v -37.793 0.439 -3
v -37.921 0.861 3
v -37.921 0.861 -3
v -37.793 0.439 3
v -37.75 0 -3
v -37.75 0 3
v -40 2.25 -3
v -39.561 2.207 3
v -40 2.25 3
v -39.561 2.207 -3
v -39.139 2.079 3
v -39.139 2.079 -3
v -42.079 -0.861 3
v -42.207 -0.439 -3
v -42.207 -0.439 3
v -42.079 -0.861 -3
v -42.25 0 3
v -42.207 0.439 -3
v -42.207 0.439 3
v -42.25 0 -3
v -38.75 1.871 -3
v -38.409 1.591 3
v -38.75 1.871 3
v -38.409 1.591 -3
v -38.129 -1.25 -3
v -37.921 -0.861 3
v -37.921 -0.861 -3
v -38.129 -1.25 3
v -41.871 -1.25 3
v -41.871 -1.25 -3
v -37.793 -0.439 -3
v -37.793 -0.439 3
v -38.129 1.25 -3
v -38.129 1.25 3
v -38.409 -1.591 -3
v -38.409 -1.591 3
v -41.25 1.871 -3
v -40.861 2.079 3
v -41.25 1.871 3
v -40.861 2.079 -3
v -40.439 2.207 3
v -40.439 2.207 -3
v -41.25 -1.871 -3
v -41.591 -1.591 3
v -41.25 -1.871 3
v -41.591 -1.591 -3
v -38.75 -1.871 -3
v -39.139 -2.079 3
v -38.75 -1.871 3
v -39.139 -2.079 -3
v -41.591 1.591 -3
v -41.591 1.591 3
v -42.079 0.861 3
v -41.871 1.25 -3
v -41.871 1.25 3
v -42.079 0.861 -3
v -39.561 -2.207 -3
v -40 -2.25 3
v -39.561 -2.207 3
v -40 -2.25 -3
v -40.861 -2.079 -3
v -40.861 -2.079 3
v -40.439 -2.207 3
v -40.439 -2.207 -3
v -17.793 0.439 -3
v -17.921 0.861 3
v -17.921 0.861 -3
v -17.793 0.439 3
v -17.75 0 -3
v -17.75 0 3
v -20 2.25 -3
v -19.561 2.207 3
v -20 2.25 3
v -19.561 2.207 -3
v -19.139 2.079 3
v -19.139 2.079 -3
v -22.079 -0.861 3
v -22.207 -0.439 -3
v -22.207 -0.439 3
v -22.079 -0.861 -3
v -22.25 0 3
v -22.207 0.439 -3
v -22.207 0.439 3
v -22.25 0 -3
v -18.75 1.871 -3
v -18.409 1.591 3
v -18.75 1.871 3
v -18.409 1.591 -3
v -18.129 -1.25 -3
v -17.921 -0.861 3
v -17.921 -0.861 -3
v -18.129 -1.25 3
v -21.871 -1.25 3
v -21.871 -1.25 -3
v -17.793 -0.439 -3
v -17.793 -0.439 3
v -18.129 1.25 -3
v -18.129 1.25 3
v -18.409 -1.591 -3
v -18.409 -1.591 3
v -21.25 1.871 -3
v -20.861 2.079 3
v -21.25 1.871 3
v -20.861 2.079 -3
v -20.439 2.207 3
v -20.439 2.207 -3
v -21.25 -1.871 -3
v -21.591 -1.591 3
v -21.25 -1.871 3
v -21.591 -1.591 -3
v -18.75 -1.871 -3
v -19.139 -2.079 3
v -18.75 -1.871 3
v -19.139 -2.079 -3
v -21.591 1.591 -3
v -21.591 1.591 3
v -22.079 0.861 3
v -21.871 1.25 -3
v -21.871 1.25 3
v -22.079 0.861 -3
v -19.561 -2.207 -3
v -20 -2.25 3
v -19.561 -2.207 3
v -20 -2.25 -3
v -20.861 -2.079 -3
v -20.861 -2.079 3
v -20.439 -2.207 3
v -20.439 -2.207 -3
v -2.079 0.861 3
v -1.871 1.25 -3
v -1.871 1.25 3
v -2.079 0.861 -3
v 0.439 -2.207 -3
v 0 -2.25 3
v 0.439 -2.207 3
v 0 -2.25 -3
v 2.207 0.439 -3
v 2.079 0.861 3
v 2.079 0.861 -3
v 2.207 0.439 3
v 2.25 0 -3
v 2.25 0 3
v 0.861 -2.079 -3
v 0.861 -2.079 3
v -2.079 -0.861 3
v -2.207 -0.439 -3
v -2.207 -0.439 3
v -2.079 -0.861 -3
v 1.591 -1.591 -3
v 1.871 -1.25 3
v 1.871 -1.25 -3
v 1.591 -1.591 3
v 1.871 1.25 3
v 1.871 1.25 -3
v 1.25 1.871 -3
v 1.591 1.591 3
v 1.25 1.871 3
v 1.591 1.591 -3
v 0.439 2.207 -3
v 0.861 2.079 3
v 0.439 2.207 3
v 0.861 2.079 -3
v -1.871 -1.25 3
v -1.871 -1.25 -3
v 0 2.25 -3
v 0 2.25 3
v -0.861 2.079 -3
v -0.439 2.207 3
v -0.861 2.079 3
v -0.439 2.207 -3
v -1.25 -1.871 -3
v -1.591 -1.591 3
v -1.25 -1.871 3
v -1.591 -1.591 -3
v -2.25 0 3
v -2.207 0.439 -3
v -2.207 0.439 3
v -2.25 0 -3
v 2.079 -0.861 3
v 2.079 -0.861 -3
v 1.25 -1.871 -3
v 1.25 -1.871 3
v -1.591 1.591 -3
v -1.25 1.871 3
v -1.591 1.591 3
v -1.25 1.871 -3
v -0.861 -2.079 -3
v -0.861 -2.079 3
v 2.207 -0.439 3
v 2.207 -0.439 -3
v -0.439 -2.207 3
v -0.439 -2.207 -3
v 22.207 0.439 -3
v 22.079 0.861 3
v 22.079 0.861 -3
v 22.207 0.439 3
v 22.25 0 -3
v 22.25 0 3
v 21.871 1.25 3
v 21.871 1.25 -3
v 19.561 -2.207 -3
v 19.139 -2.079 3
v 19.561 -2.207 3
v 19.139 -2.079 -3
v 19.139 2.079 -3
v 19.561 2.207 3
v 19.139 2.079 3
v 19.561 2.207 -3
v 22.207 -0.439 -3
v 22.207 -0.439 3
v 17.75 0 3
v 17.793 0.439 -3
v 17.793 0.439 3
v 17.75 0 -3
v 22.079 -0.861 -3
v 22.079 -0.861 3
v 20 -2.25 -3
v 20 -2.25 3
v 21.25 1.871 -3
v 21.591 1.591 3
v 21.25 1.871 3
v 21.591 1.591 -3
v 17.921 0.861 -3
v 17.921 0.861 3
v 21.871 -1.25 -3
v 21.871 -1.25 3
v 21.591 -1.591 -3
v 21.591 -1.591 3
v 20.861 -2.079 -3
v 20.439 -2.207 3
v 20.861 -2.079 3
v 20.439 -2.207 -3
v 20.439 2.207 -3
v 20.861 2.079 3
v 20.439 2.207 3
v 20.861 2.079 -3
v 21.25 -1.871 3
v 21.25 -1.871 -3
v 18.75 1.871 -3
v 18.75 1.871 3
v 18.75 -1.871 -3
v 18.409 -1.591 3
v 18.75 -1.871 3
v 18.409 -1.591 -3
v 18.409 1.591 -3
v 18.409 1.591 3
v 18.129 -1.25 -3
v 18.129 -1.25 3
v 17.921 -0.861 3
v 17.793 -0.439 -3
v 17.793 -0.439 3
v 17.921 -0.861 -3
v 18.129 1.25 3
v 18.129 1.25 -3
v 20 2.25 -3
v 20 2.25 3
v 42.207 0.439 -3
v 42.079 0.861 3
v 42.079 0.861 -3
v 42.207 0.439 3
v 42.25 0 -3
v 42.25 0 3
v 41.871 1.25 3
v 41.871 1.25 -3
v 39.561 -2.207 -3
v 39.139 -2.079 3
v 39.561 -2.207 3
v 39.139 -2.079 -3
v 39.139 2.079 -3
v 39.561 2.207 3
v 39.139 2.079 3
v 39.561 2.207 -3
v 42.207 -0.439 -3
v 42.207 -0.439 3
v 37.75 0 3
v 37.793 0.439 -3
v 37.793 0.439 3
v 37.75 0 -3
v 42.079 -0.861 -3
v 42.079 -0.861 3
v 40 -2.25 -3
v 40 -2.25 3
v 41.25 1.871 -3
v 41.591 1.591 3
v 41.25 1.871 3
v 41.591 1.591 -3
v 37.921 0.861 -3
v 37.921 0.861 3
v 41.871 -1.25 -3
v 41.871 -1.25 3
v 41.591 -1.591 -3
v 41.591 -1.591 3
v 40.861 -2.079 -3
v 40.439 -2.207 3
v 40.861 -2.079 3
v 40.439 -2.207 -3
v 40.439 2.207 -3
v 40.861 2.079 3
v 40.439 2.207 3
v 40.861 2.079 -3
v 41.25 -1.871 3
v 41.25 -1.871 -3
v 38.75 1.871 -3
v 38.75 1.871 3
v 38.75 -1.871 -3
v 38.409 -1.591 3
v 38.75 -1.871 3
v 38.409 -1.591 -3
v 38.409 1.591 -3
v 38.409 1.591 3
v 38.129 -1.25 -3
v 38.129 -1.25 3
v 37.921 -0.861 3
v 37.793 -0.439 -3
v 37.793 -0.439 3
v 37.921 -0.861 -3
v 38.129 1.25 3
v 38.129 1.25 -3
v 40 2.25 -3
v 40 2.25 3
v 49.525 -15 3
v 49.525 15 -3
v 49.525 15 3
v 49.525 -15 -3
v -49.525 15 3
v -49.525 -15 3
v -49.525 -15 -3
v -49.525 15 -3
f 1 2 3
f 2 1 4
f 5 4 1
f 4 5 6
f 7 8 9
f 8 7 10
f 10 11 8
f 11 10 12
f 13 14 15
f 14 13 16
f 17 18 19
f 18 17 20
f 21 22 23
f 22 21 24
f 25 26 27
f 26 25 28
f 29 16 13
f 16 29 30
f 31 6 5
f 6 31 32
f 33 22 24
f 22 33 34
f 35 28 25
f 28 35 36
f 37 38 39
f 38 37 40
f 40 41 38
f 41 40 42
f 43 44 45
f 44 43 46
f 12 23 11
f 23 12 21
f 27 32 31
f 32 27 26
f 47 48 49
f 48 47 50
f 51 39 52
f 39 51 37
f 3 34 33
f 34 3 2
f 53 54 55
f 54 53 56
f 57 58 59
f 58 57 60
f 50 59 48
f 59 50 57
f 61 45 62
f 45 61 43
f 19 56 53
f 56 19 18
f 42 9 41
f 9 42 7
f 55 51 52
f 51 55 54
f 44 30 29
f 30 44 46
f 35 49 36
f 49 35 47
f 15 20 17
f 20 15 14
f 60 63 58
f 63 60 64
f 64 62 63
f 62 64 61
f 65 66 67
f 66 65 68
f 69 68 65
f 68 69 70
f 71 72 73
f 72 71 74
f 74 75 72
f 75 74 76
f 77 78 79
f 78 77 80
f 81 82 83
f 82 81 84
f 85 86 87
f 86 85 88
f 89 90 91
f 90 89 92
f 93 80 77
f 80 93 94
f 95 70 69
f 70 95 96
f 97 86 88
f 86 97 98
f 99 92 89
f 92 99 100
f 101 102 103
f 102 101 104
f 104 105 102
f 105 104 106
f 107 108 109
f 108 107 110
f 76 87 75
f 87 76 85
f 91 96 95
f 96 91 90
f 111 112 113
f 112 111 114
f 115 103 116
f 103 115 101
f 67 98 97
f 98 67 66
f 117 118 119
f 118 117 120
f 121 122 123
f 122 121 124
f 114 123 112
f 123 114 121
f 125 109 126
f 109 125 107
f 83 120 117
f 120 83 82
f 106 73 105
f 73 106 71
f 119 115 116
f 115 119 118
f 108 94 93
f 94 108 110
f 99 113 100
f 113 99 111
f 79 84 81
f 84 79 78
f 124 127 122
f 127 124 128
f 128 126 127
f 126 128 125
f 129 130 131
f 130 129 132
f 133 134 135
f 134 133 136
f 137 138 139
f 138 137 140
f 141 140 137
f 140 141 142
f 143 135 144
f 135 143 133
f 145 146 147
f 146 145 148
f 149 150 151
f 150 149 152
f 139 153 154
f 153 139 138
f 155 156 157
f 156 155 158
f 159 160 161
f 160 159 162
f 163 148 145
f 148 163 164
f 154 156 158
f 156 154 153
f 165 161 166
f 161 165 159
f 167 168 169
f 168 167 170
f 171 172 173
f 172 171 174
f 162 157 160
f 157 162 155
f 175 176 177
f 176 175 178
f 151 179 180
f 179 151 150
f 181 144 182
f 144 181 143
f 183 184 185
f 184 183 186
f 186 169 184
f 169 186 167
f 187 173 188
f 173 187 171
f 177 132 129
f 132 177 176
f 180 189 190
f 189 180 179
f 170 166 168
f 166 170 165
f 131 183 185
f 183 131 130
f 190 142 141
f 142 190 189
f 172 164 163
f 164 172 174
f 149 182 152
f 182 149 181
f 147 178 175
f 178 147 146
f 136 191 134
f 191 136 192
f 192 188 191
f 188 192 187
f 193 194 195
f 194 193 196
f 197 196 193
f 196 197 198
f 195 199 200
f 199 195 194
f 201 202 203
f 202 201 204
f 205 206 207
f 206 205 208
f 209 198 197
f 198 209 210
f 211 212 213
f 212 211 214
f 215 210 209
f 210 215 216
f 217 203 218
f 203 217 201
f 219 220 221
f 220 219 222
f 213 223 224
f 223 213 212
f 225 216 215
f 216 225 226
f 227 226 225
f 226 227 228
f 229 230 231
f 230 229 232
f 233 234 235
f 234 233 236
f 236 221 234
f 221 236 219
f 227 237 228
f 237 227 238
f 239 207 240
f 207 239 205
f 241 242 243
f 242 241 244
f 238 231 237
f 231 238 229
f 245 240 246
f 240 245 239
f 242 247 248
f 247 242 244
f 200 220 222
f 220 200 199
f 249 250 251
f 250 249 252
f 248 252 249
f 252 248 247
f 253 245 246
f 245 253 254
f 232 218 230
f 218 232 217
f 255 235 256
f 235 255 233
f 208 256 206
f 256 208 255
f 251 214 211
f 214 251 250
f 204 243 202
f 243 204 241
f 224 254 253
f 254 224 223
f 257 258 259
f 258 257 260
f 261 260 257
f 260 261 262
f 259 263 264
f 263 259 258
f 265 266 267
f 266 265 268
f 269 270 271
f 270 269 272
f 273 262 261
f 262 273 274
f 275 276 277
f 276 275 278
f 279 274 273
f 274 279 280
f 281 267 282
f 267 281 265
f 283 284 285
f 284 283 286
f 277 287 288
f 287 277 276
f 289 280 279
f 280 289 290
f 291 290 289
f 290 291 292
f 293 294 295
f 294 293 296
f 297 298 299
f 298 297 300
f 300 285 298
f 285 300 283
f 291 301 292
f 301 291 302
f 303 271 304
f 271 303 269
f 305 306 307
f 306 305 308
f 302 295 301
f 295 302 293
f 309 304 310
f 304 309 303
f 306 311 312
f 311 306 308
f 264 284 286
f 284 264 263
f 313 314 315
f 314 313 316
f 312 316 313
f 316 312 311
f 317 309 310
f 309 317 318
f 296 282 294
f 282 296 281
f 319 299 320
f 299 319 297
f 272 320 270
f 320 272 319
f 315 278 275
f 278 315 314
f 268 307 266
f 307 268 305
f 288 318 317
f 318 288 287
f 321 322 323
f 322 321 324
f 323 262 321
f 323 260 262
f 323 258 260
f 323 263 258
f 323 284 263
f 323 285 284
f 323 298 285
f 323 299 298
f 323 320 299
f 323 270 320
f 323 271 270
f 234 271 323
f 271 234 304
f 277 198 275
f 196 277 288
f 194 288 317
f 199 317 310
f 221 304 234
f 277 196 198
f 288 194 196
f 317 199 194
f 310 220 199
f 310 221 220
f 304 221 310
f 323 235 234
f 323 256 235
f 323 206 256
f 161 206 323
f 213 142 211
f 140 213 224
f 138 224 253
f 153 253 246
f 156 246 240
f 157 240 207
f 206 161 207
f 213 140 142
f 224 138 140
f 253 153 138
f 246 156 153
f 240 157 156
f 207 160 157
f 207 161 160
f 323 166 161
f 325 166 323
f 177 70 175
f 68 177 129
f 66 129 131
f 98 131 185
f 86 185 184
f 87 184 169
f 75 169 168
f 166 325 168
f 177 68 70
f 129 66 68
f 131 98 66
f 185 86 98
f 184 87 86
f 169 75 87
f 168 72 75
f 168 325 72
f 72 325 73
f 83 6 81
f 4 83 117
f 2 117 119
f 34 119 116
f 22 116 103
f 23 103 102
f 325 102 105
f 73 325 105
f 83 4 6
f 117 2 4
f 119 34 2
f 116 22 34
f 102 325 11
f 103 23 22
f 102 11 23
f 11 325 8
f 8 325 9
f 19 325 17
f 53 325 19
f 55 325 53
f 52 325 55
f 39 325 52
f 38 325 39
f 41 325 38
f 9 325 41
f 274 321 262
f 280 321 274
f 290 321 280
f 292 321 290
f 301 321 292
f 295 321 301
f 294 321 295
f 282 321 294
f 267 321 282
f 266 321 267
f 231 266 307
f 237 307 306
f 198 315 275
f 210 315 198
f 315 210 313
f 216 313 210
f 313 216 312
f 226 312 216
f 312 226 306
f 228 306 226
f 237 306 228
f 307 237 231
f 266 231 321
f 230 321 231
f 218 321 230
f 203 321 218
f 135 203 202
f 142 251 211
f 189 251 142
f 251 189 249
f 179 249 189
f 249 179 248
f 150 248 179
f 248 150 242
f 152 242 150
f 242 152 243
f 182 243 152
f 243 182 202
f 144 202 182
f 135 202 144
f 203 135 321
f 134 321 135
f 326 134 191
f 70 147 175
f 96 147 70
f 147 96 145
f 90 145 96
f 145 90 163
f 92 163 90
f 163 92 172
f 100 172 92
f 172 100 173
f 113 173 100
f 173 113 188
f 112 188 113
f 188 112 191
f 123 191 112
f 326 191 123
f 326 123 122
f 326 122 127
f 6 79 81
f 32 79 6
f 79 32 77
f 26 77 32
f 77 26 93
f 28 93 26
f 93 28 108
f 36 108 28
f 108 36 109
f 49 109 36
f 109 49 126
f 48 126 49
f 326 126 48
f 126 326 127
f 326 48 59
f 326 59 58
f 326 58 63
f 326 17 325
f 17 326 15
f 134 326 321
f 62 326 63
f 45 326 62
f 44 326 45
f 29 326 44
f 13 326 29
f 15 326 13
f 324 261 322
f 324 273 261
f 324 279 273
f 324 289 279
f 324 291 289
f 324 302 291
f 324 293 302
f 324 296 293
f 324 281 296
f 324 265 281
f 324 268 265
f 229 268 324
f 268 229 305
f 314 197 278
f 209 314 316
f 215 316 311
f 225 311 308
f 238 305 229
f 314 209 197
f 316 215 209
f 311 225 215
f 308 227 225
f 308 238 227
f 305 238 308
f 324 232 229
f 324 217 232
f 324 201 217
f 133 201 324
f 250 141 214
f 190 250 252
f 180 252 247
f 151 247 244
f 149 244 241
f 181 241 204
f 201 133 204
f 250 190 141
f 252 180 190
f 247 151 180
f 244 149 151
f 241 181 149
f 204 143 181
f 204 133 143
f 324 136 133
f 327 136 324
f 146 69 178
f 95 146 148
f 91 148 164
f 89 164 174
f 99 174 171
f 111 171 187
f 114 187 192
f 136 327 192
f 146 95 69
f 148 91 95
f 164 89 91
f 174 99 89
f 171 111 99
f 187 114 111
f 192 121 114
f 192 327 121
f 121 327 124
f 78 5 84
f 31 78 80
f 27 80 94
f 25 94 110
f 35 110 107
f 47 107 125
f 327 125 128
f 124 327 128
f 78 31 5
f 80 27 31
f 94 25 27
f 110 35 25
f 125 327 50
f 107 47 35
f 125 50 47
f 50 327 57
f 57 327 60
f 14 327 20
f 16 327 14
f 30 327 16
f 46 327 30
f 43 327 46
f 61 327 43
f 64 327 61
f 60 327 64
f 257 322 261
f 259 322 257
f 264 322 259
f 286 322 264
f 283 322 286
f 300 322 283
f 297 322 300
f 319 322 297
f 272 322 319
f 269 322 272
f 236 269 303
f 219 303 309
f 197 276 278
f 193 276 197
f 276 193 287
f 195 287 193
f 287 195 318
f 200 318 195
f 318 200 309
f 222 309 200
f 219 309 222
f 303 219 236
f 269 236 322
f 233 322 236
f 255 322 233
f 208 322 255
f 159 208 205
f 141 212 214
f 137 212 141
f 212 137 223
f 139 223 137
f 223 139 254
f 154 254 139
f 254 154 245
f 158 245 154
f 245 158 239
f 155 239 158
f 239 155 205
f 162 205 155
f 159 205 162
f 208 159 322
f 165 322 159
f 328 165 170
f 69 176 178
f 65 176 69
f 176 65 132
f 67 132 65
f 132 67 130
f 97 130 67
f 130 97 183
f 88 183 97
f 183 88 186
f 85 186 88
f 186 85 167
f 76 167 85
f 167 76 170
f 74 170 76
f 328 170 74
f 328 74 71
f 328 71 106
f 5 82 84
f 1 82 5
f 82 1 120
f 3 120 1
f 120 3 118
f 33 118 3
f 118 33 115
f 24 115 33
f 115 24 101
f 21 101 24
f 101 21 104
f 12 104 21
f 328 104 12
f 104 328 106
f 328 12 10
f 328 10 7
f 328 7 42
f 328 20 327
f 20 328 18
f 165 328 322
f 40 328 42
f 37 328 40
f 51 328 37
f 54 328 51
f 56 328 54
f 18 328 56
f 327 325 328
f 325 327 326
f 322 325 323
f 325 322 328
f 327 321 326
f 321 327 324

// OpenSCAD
$fn = 32;

// ----------------------------------------------------------------------
// Hole bar, 5 x Ø4.5
// skip layout, 9.525 mm edge offset
// ----------------------------------------------------------------------

// --- parameters (mm) ---
bar_w = 30;       // bar width (Y)
bar_t = 6;        // bar thickness (Z)
holes = 5;        // holes per row
hole_d = 4.5;     // hole diameter
edge = 9.525;     // offset from the bar end to the first hole
grid_pitch = 10;  // grid the bar was laid out on

// --- derived feature positions (mm) ---
pitch = grid_pitch * 2;       // = 20   holes sit every other grid slot
span = (holes - 1) * pitch;   // = 80   distance between the end holes
bar_l = span + 2 * edge;      // = 99.05   overall bar length
start_x = -bar_l / 2 + edge;  // = -40   X of the first hole
feature_centers = [
  [start_x + 0 * pitch, 0],
  [start_x + 1 * pitch, 0],
  [start_x + 2 * pitch, 0],
  [start_x + 3 * pitch, 0],
  [start_x + 4 * pitch, 0]
];   // hole centres of the first row

// bar with one row of holes, drilled from feature_centers
difference() {
  translate([-bar_l / 2, -bar_w / 2, -bar_t / 2]) cube([bar_l, bar_w, bar_t]);
  for (centre = feature_centers)
    translate([centre[0], centre[1], 0])
      cylinder(d = hole_d, h = bar_t + 2, center = true);
}
